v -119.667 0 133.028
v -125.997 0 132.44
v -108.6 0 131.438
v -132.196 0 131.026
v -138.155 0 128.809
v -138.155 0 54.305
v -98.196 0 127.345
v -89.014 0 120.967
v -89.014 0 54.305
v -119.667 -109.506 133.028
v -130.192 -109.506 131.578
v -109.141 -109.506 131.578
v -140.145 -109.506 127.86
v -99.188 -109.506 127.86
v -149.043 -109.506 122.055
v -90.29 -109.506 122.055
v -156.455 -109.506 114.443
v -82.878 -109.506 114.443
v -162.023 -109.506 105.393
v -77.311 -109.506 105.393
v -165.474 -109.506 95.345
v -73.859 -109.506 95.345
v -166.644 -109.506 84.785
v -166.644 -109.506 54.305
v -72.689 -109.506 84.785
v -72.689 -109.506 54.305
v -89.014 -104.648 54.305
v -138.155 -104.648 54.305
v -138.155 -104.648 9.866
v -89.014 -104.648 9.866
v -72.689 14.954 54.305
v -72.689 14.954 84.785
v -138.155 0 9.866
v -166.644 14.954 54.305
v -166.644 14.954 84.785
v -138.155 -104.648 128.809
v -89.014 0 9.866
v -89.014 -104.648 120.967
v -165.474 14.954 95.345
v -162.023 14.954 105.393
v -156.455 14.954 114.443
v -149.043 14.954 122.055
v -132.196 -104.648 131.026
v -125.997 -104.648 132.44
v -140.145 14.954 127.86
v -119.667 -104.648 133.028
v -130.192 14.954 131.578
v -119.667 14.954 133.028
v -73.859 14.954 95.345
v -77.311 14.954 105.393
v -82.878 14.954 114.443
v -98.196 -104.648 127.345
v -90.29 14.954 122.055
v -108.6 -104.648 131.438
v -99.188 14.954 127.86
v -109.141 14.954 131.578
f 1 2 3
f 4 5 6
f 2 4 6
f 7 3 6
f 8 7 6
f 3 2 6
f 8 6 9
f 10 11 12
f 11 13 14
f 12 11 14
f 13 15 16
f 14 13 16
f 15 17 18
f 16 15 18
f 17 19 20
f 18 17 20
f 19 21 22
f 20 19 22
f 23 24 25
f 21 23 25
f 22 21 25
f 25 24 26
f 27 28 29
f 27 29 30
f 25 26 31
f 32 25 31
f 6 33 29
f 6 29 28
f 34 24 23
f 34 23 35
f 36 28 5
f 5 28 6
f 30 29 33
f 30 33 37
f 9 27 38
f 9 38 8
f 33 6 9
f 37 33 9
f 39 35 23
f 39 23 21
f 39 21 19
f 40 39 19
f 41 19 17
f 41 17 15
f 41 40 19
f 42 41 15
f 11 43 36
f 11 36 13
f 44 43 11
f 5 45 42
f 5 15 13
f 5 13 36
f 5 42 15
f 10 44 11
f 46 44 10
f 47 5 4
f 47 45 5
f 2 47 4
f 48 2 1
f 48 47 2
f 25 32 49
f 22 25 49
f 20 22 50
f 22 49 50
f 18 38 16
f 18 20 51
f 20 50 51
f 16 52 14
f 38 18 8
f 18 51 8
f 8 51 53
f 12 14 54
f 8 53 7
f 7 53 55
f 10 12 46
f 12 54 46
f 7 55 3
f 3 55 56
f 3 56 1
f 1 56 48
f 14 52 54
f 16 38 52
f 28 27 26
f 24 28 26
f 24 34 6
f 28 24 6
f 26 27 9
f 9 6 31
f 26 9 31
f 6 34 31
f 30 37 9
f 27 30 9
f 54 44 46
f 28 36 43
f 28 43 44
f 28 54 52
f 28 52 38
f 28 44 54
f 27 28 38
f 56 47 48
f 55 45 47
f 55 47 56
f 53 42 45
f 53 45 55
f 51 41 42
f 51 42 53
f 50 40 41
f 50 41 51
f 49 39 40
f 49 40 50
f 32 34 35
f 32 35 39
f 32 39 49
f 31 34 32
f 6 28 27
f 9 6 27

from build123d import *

# Parameters (mm, degrees)
F0_W        = 49.1408258677
F0_H        = 44.438412413
F1_DEPTH    = 104.648
F2_W        = 93.9549271504
F2_H        = 124.46
F2_W_2      = 49.1408258677
F2_H_2      = 104.648
F3_DEPTH    = 78.74
F4_T1_DEPTH = 365.76


# Not quite as in the source:
# - a fillet or chamfer that OpenCascade refuses, or shapes differently, is made with other operations: its cross-section is extruded or revolved along the edge and cut away or added


with BuildPart() as f1:
    # F0 (on Front) → F1 (new body)
    with BuildSketch(Plane.XZ):
        with Locations((-113.5842874646, 32.0855602622)):
            Rectangle(F0_W, F0_H)
    extrude(amount=F1_DEPTH)


with BuildPart() as f3:
    # F2 (on face) → F3 (new body)
    with BuildSketch(Plane.XY.offset(54.3047664687)):
        with Locations((-119.6665391326, -47.2755730152)):
            Rectangle(F2_W, F2_H)
        with Locations((-113.5842874646, -52.324)):
            Rectangle(F2_W_2, F2_H_2, mode=Mode.SUBTRACT)
    extrude(amount=F3_DEPTH)

    # F4: fillet of radius 48.26 on 2 edges, made by hand

    # F4_s2 → F4_t1 (cut)
    with BuildSketch(Plane.XZ.offset(-135.6044269848)):
        with BuildLine():
            ThreePointArc((-72.6890755574, 84.7847664687), (-86.8241022974, 118.9097397288), (-120.9490755574, 133.0447664687))
            Line((-120.9490755574, 133.0447664687), (-72.6890755574, 133.0447664687))
            Line((-72.6890755574, 133.0447664687), (-72.6890755574, 84.7847664687))
        make_face()
        with BuildLine():
            ThreePointArc((-166.6440027078, 84.7847664687), (-152.5089759678, 118.9097397288), (-118.3840027078, 133.0447664687))
            Line((-118.3840027078, 133.0447664687), (-166.6440027078, 133.0447664687))
            Line((-166.6440027078, 133.0447664687), (-166.6440027078, 84.7847664687))
        make_face()
    extrude(amount=F4_T1_DEPTH, mode=Mode.SUBTRACT)


solid = Compound([f1.part, f3.part])
